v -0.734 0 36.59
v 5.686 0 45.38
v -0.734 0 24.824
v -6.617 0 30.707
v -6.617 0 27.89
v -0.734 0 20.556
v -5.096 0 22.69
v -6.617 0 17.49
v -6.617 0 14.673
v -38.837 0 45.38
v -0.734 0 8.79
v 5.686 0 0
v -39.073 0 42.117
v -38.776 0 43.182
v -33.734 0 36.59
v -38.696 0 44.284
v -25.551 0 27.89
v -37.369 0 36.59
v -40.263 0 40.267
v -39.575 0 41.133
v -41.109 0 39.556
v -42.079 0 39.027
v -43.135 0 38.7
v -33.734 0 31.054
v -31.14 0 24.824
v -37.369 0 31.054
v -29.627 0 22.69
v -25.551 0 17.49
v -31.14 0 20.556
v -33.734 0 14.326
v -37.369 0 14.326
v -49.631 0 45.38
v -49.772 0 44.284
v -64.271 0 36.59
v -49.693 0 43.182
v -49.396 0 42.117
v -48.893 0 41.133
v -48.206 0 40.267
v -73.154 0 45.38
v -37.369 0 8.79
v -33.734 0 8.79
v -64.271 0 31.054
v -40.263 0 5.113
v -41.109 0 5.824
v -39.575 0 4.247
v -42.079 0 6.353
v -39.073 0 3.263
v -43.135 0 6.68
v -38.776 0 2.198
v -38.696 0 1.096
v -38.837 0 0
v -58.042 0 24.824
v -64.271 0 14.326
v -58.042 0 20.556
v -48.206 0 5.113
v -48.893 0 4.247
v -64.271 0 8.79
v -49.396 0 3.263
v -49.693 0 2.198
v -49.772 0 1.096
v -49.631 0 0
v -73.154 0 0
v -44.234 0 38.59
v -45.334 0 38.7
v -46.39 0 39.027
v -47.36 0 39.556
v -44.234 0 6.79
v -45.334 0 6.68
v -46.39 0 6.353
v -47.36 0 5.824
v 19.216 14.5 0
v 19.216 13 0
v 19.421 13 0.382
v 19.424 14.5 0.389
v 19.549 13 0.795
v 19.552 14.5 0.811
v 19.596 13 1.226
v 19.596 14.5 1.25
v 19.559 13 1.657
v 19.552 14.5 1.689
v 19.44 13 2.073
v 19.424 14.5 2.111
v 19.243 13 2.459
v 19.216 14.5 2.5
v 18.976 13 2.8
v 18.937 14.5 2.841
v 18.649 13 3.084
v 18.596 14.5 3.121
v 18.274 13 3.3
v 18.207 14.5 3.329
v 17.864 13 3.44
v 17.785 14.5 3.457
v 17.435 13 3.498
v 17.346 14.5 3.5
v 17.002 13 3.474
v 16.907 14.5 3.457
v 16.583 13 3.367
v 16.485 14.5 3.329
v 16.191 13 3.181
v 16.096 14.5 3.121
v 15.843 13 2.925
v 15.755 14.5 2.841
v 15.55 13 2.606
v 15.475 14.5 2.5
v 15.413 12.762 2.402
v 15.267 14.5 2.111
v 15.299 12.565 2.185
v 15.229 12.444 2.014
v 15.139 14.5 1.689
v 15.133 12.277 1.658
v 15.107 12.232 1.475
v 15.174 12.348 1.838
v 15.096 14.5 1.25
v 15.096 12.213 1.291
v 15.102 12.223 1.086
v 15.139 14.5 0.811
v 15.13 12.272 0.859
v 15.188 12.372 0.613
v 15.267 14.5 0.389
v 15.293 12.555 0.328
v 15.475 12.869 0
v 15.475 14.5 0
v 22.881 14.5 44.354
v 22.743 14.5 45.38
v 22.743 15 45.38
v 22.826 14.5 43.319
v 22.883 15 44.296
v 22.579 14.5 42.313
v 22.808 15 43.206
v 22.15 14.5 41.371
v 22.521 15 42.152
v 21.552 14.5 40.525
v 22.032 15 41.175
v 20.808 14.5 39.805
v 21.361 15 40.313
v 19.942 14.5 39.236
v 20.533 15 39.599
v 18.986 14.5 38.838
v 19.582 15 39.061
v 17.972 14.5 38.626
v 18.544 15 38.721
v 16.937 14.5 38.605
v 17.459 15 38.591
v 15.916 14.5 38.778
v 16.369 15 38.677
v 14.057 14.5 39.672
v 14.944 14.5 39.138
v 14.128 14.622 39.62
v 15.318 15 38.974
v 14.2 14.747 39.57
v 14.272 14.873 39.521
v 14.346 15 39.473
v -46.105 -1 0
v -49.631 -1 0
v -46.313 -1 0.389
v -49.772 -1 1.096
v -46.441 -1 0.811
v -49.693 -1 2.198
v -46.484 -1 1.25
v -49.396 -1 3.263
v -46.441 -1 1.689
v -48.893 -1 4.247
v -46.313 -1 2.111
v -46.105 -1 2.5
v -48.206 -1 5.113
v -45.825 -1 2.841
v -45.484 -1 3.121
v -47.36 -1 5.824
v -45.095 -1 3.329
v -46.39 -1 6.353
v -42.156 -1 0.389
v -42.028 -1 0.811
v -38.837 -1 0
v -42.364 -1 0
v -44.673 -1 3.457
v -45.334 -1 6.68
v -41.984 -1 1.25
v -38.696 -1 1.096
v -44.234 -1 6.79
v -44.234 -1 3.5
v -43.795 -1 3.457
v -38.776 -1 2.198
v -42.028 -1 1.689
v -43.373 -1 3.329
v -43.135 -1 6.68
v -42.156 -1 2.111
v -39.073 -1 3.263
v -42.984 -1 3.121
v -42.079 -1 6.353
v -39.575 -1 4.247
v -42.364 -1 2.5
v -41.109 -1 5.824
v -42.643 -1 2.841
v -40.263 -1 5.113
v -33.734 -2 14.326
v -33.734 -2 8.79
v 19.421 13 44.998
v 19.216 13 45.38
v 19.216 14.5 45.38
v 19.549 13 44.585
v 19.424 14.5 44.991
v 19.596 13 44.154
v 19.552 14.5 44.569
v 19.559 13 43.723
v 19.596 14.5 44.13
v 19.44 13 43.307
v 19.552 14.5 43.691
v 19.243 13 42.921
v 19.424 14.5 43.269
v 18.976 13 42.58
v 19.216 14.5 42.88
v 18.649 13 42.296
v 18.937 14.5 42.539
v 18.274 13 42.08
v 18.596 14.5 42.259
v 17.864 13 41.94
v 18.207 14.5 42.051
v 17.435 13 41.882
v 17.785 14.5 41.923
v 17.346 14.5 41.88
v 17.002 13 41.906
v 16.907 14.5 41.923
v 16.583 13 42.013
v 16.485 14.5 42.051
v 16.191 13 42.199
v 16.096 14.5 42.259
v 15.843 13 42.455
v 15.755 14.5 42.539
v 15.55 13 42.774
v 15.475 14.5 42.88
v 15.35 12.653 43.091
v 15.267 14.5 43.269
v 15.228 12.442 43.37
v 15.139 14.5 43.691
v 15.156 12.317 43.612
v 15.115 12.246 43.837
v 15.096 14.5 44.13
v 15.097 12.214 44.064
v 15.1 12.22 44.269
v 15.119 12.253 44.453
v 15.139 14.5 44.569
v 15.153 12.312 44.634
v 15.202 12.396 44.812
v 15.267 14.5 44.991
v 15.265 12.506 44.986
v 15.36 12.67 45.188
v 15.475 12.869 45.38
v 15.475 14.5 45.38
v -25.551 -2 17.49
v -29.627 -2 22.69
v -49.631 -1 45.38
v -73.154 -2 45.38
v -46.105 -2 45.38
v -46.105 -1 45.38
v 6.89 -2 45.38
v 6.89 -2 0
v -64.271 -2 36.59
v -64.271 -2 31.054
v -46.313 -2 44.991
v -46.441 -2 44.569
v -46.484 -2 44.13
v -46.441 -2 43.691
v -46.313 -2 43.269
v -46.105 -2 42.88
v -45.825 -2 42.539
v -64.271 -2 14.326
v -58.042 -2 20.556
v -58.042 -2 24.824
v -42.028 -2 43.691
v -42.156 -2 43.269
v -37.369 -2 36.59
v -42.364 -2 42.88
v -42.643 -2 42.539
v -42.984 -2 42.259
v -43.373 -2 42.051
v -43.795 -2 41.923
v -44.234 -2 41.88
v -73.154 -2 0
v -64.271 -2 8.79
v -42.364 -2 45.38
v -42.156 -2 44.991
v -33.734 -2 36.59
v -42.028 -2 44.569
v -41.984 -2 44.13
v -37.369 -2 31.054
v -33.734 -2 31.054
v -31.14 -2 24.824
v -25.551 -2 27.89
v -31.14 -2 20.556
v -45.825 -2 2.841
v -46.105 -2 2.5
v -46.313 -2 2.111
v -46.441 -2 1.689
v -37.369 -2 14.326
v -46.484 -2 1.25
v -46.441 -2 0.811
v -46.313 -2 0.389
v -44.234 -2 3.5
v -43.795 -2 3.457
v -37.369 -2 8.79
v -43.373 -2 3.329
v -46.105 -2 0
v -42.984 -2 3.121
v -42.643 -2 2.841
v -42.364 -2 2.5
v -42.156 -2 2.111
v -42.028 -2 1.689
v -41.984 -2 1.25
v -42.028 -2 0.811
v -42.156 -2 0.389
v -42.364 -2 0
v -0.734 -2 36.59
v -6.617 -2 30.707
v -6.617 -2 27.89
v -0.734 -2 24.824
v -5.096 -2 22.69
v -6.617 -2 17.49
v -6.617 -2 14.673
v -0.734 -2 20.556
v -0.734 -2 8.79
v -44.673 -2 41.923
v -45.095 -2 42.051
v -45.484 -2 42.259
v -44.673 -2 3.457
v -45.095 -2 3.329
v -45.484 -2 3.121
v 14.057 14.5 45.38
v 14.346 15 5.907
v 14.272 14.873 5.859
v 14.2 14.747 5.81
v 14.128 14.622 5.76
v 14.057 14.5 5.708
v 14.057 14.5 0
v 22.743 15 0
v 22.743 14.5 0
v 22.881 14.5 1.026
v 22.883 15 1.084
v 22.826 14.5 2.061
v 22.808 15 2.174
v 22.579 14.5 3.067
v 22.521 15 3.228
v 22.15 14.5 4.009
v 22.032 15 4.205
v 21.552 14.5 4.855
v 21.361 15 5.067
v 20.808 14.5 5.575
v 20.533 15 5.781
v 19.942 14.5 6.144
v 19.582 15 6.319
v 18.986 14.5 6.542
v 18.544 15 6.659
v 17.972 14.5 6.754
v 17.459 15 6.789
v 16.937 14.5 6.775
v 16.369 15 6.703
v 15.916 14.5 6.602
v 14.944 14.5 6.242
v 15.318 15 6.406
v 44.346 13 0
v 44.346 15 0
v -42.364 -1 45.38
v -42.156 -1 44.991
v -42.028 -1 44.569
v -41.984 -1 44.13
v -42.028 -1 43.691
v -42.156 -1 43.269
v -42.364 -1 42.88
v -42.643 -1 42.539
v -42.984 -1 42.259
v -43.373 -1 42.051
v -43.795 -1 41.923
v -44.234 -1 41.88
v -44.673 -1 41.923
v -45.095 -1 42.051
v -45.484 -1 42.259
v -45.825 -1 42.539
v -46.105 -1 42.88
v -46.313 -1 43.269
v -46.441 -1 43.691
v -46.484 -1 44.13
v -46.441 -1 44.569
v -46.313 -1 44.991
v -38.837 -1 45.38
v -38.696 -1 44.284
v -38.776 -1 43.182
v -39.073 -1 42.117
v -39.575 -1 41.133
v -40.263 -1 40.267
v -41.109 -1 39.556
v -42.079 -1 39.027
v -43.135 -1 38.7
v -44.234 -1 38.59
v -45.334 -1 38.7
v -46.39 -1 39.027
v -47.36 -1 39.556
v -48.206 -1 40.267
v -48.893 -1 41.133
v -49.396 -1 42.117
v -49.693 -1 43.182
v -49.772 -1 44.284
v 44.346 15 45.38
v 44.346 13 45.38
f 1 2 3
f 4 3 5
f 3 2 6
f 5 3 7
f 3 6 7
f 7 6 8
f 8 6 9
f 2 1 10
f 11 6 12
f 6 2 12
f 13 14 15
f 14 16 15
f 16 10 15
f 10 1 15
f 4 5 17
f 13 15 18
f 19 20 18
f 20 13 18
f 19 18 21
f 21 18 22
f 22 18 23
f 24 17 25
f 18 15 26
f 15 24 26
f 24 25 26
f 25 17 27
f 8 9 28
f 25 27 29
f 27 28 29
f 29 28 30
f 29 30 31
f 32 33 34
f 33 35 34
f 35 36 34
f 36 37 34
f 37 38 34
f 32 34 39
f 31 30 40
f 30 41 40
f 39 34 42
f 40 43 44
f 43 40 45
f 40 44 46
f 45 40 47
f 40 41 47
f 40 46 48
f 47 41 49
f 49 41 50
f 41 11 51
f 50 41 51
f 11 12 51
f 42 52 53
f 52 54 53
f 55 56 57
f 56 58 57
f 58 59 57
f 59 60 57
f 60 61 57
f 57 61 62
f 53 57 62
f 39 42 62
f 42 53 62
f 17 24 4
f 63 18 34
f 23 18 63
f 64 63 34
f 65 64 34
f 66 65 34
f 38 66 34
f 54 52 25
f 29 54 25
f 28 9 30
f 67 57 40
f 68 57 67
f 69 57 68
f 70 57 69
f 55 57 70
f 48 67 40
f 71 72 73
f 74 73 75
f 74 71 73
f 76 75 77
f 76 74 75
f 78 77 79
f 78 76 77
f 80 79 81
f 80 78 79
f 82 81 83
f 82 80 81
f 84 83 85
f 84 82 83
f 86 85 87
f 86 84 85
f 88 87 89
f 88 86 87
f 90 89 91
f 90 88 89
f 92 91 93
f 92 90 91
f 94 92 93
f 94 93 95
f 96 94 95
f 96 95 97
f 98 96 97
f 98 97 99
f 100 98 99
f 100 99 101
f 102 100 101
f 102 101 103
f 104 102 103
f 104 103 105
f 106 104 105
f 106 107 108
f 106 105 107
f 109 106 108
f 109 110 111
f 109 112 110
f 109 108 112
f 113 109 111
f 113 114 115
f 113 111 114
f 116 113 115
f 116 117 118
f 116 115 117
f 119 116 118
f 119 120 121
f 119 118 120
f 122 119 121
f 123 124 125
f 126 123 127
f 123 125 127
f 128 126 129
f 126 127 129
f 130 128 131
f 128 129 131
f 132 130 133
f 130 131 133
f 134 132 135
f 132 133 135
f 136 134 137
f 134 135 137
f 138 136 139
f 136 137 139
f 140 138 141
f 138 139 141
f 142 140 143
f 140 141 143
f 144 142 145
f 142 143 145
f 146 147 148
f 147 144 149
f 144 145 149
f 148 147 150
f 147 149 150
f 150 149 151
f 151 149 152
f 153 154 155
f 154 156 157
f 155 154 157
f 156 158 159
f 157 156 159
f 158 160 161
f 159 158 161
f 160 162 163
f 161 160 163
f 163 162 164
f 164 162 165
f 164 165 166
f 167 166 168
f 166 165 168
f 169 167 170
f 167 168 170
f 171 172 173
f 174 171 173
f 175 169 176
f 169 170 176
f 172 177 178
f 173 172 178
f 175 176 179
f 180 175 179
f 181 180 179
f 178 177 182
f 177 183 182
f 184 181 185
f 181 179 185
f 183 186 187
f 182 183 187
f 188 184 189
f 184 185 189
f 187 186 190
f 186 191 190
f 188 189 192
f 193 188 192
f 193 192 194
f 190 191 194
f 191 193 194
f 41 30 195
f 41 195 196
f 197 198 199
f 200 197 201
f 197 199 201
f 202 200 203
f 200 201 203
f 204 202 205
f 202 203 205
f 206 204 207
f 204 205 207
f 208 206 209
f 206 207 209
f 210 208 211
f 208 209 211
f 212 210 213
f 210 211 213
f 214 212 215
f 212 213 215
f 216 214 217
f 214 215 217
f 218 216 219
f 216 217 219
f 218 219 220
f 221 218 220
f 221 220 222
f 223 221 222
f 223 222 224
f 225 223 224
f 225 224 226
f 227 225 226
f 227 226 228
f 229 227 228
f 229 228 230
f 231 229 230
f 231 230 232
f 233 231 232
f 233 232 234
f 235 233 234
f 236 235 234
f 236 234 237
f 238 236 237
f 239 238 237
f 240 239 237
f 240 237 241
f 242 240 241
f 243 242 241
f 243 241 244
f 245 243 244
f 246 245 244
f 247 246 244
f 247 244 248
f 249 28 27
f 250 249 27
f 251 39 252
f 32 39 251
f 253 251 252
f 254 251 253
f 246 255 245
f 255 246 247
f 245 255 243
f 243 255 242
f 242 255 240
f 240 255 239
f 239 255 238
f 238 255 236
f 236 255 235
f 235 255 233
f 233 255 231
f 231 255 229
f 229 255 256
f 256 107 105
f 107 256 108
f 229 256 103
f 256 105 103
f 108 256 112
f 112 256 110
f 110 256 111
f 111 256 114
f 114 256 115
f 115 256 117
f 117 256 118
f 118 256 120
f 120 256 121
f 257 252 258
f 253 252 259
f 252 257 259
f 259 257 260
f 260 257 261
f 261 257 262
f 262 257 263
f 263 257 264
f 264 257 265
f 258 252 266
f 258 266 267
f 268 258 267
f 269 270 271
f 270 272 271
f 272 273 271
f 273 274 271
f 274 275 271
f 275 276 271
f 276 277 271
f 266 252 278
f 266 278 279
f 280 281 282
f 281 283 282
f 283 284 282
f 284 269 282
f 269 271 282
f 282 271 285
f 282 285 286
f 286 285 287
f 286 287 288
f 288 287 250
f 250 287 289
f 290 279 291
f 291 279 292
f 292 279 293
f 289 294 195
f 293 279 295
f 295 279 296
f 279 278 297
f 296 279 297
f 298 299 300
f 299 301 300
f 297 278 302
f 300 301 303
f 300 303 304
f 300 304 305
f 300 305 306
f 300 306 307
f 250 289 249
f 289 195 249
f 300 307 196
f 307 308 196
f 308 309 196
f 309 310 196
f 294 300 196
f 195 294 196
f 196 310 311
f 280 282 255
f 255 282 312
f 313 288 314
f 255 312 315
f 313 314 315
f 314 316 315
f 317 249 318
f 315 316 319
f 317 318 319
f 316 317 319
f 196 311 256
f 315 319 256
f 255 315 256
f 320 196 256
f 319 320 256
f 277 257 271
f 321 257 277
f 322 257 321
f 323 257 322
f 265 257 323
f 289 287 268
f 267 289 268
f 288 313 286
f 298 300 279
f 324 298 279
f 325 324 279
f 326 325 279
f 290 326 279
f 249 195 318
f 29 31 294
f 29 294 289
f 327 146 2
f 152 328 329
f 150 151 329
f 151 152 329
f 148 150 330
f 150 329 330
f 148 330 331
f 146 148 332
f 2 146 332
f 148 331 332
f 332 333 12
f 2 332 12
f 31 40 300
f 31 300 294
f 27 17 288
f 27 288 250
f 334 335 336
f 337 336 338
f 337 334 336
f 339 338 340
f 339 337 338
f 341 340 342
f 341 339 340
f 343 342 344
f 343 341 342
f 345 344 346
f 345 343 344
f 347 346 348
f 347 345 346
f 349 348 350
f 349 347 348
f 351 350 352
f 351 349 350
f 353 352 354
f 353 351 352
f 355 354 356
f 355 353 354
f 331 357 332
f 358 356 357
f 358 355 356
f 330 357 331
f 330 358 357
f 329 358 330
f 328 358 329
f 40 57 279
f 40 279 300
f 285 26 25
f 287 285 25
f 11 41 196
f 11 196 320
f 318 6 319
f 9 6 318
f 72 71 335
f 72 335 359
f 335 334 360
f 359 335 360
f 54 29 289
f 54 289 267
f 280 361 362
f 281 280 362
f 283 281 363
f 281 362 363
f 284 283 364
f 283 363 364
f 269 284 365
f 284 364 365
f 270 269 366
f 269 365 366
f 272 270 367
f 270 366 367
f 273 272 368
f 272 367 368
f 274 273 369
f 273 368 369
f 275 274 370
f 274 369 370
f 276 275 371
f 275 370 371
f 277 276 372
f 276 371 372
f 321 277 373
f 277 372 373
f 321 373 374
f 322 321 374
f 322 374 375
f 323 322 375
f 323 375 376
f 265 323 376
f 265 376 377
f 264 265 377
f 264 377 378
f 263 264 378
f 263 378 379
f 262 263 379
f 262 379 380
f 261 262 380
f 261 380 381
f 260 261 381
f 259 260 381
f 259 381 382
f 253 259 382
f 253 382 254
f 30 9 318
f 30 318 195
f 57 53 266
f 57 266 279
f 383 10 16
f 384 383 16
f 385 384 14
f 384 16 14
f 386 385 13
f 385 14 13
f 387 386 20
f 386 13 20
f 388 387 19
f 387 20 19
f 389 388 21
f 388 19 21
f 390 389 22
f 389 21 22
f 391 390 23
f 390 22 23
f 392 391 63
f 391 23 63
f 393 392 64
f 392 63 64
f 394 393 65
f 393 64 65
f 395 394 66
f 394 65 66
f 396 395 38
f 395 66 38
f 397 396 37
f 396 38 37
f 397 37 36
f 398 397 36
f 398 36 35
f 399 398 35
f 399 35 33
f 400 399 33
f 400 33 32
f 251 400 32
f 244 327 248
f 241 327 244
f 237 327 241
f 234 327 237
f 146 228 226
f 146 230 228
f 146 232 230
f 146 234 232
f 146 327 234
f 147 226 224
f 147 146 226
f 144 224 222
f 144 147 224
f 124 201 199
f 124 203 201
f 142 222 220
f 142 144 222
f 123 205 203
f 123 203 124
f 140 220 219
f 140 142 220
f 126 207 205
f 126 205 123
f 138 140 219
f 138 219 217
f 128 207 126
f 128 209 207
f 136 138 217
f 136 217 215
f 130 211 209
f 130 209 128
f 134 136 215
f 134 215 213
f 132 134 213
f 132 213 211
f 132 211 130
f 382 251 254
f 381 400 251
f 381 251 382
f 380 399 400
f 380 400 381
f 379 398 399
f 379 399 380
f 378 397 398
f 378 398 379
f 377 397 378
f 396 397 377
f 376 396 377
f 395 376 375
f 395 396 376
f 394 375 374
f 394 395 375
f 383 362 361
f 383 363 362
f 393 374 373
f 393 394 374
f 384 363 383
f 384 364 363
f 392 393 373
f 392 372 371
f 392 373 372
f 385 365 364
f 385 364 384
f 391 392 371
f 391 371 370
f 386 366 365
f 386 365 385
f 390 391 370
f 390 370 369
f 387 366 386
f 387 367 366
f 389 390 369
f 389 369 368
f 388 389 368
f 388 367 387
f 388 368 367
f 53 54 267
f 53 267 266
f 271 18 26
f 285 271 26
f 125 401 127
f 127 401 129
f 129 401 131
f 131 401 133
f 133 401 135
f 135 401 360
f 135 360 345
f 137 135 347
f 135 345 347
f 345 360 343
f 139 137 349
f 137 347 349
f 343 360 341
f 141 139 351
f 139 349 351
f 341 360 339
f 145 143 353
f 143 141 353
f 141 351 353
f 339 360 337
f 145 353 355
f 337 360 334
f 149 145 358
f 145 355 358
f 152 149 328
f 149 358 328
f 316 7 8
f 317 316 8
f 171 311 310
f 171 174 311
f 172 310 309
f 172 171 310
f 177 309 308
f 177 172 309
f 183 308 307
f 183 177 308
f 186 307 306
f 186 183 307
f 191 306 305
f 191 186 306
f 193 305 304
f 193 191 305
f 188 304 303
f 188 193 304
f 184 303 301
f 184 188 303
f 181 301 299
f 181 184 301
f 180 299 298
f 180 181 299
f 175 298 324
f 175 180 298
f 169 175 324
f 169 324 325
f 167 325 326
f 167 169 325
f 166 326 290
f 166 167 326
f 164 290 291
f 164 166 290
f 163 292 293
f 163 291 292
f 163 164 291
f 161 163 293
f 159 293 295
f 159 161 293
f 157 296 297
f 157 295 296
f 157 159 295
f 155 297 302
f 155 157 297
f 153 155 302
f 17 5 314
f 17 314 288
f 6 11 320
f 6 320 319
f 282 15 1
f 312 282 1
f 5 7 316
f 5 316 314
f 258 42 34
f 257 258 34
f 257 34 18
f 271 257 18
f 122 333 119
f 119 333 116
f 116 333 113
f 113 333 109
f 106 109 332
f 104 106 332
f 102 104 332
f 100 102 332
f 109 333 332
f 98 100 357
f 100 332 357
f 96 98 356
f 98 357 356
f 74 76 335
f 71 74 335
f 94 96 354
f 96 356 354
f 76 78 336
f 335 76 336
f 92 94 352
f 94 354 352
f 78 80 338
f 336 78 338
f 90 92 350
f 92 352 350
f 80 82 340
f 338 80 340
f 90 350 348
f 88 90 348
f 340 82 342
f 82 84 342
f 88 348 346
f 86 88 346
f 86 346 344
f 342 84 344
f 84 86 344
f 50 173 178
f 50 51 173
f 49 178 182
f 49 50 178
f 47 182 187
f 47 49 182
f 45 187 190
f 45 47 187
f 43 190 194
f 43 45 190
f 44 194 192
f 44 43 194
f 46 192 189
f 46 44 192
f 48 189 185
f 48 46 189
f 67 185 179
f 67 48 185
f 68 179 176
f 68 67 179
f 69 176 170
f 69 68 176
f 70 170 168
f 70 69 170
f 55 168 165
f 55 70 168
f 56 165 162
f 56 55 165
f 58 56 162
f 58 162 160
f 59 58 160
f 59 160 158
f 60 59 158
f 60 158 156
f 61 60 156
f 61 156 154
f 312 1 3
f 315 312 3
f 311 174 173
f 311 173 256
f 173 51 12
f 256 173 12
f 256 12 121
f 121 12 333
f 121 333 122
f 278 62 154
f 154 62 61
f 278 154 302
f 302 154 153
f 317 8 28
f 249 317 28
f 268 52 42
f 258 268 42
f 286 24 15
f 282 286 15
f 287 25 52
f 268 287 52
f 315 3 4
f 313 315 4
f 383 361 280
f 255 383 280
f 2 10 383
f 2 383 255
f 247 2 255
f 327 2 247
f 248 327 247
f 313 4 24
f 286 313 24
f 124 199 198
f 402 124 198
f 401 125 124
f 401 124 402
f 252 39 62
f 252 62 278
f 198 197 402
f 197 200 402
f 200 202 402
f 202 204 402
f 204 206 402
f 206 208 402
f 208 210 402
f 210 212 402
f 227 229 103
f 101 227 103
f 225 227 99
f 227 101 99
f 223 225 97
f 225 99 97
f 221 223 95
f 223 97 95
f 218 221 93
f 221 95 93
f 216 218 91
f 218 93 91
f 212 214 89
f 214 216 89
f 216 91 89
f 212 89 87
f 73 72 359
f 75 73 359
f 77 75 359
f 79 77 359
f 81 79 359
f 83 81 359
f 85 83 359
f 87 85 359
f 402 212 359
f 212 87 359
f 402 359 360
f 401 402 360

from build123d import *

# Parameters (mm, degrees)
BOSS_EXTRUDE1_DEPTH = 45.38
SKETCH4_R           = 2.25
CUT_EXTRUDE3_DEPTH  = 14.99956
SKETCH5_R           = 5.54
CUT_EXTRUDE4_DEPTH  = 0.5
CUT_EXTRUDE5_DEPTH  = 2
CUT_EXTRUDE6_DEPTH  = 2
SKETCH2_R           = 2.25
CUT_EXTRUDE7_DEPTH  = 2
SKETCH8_R           = 5.54
CUT_EXTRUDE8_DEPTH  = 1


with BuildPart() as part:
    # Sketch1 → Boss-Extrude1 (new body)
    with BuildSketch(Plane.XY):
        Polygon((-73.15434201, 0), (-73.15434201, -2), (6.88994551, -2), (15.54994551, 12.999559994), (44.34565799, 12.999559994), (44.34565799, 14.999559994), (14.34565799, 14.999559994), (5.68565799, 0), align=None)
    extrude(amount=BOSS_EXTRUDE1_DEPTH)

    # Sketch4 → Cut-Extrude3 (cut)
    with BuildSketch(Plane(origin=(0, 14.999559994, 0), x_dir=(1, 0, 0), z_dir=(0, 1, 0))):
        with Locations((17.34565799, -44.13)):
            Circle(SKETCH4_R)
    cut_extrude3 = extrude(amount=-CUT_EXTRUDE3_DEPTH, mode=Mode.SUBTRACT)

    # Sketch5 → Cut-Extrude4 (cut)
    with BuildSketch(Plane(origin=(0, 14.999559994, 0), x_dir=(1, 0, 0), z_dir=(0, 1, 0))):
        with Locations((17.34565799, -44.13)):
            Circle(SKETCH5_R)
    cut_extrude4 = extrude(amount=-CUT_EXTRUDE4_DEPTH, mode=Mode.SUBTRACT)

    # Sketch6 → Cut-Extrude5 (cut)
    with BuildSketch(Plane(origin=(0, 0, 0), x_dir=(1, 0, 0), z_dir=(0, 1, 0))):
        Polygon((-0.73434201, -36.59), (-0.73434201, -24.824385528), (-6.617149247, -30.707192764), (-33.73434201, -31.053746412), (-33.73434201, -36.59), align=None)
        Polygon((-37.368890626, -36.59), (-37.368890626, -31.053746412), (-31.139529741, -24.824385528), (-58.04173908, -24.824385528), (-64.271099965, -31.053746412), (-64.271099965, -36.59), align=None)
    cut_extrude5 = extrude(amount=-CUT_EXTRUDE5_DEPTH, mode=Mode.SUBTRACT)

    # Sketch7 → Cut-Extrude6 (cut)
    with BuildSketch(Plane(origin=(0, 0, 0), x_dir=(1, 0, 0), z_dir=(0, 1, 0))):
        Polygon((-5.095840943, -22.69), (-6.617149247, -27.890480059), (-25.551142536, -27.890480059), (-29.626528294, -22.69), align=None)
    cut_extrude6 = extrude(amount=-CUT_EXTRUDE6_DEPTH, mode=Mode.SUBTRACT)

    # Sketch2 → Cut-Extrude7 (cut)
    with BuildSketch(Plane(origin=(0, 0, 0), x_dir=(1, 0, 0), z_dir=(0, 1, 0))):
        with Locations((-44.23434201, -44.13)):
            Circle(SKETCH2_R)
    cut_extrude7 = extrude(amount=-CUT_EXTRUDE7_DEPTH, mode=Mode.SUBTRACT)

    # Sketch8 → Cut-Extrude8 (cut)
    with BuildSketch(Plane(origin=(0, 0, 0), x_dir=(1, 0, 0), z_dir=(0, 1, 0))):
        with Locations((-44.23434201, -44.13)):
            Circle(SKETCH8_R)
    cut_extrude8 = extrude(amount=-CUT_EXTRUDE8_DEPTH, mode=Mode.SUBTRACT)

    # Mirror1: Cut-Extrude3, Cut-Extrude4, Cut-Extrude5, Cut-Extrude6, Cut-Extrude7, Cut-Extrude8 across plane
    add(cut_extrude3.mirror(Plane(origin=(0, 0, 22.69), x_dir=(1, 0, 0), z_dir=(0, 0, -1))), mode=Mode.SUBTRACT)
    add(cut_extrude4.mirror(Plane(origin=(0, 0, 22.69), x_dir=(1, 0, 0), z_dir=(0, 0, -1))), mode=Mode.SUBTRACT)
    add(cut_extrude5.mirror(Plane(origin=(0, 0, 22.69), x_dir=(1, 0, 0), z_dir=(0, 0, -1))), mode=Mode.SUBTRACT)
    add(cut_extrude6.mirror(Plane(origin=(0, 0, 22.69), x_dir=(1, 0, 0), z_dir=(0, 0, -1))), mode=Mode.SUBTRACT)
    add(cut_extrude7.mirror(Plane(origin=(0, 0, 22.69), x_dir=(1, 0, 0), z_dir=(0, 0, -1))), mode=Mode.SUBTRACT)
    add(cut_extrude8.mirror(Plane(origin=(0, 0, 22.69), x_dir=(1, 0, 0), z_dir=(0, 0, -1))), mode=Mode.SUBTRACT)


solid = part.part
